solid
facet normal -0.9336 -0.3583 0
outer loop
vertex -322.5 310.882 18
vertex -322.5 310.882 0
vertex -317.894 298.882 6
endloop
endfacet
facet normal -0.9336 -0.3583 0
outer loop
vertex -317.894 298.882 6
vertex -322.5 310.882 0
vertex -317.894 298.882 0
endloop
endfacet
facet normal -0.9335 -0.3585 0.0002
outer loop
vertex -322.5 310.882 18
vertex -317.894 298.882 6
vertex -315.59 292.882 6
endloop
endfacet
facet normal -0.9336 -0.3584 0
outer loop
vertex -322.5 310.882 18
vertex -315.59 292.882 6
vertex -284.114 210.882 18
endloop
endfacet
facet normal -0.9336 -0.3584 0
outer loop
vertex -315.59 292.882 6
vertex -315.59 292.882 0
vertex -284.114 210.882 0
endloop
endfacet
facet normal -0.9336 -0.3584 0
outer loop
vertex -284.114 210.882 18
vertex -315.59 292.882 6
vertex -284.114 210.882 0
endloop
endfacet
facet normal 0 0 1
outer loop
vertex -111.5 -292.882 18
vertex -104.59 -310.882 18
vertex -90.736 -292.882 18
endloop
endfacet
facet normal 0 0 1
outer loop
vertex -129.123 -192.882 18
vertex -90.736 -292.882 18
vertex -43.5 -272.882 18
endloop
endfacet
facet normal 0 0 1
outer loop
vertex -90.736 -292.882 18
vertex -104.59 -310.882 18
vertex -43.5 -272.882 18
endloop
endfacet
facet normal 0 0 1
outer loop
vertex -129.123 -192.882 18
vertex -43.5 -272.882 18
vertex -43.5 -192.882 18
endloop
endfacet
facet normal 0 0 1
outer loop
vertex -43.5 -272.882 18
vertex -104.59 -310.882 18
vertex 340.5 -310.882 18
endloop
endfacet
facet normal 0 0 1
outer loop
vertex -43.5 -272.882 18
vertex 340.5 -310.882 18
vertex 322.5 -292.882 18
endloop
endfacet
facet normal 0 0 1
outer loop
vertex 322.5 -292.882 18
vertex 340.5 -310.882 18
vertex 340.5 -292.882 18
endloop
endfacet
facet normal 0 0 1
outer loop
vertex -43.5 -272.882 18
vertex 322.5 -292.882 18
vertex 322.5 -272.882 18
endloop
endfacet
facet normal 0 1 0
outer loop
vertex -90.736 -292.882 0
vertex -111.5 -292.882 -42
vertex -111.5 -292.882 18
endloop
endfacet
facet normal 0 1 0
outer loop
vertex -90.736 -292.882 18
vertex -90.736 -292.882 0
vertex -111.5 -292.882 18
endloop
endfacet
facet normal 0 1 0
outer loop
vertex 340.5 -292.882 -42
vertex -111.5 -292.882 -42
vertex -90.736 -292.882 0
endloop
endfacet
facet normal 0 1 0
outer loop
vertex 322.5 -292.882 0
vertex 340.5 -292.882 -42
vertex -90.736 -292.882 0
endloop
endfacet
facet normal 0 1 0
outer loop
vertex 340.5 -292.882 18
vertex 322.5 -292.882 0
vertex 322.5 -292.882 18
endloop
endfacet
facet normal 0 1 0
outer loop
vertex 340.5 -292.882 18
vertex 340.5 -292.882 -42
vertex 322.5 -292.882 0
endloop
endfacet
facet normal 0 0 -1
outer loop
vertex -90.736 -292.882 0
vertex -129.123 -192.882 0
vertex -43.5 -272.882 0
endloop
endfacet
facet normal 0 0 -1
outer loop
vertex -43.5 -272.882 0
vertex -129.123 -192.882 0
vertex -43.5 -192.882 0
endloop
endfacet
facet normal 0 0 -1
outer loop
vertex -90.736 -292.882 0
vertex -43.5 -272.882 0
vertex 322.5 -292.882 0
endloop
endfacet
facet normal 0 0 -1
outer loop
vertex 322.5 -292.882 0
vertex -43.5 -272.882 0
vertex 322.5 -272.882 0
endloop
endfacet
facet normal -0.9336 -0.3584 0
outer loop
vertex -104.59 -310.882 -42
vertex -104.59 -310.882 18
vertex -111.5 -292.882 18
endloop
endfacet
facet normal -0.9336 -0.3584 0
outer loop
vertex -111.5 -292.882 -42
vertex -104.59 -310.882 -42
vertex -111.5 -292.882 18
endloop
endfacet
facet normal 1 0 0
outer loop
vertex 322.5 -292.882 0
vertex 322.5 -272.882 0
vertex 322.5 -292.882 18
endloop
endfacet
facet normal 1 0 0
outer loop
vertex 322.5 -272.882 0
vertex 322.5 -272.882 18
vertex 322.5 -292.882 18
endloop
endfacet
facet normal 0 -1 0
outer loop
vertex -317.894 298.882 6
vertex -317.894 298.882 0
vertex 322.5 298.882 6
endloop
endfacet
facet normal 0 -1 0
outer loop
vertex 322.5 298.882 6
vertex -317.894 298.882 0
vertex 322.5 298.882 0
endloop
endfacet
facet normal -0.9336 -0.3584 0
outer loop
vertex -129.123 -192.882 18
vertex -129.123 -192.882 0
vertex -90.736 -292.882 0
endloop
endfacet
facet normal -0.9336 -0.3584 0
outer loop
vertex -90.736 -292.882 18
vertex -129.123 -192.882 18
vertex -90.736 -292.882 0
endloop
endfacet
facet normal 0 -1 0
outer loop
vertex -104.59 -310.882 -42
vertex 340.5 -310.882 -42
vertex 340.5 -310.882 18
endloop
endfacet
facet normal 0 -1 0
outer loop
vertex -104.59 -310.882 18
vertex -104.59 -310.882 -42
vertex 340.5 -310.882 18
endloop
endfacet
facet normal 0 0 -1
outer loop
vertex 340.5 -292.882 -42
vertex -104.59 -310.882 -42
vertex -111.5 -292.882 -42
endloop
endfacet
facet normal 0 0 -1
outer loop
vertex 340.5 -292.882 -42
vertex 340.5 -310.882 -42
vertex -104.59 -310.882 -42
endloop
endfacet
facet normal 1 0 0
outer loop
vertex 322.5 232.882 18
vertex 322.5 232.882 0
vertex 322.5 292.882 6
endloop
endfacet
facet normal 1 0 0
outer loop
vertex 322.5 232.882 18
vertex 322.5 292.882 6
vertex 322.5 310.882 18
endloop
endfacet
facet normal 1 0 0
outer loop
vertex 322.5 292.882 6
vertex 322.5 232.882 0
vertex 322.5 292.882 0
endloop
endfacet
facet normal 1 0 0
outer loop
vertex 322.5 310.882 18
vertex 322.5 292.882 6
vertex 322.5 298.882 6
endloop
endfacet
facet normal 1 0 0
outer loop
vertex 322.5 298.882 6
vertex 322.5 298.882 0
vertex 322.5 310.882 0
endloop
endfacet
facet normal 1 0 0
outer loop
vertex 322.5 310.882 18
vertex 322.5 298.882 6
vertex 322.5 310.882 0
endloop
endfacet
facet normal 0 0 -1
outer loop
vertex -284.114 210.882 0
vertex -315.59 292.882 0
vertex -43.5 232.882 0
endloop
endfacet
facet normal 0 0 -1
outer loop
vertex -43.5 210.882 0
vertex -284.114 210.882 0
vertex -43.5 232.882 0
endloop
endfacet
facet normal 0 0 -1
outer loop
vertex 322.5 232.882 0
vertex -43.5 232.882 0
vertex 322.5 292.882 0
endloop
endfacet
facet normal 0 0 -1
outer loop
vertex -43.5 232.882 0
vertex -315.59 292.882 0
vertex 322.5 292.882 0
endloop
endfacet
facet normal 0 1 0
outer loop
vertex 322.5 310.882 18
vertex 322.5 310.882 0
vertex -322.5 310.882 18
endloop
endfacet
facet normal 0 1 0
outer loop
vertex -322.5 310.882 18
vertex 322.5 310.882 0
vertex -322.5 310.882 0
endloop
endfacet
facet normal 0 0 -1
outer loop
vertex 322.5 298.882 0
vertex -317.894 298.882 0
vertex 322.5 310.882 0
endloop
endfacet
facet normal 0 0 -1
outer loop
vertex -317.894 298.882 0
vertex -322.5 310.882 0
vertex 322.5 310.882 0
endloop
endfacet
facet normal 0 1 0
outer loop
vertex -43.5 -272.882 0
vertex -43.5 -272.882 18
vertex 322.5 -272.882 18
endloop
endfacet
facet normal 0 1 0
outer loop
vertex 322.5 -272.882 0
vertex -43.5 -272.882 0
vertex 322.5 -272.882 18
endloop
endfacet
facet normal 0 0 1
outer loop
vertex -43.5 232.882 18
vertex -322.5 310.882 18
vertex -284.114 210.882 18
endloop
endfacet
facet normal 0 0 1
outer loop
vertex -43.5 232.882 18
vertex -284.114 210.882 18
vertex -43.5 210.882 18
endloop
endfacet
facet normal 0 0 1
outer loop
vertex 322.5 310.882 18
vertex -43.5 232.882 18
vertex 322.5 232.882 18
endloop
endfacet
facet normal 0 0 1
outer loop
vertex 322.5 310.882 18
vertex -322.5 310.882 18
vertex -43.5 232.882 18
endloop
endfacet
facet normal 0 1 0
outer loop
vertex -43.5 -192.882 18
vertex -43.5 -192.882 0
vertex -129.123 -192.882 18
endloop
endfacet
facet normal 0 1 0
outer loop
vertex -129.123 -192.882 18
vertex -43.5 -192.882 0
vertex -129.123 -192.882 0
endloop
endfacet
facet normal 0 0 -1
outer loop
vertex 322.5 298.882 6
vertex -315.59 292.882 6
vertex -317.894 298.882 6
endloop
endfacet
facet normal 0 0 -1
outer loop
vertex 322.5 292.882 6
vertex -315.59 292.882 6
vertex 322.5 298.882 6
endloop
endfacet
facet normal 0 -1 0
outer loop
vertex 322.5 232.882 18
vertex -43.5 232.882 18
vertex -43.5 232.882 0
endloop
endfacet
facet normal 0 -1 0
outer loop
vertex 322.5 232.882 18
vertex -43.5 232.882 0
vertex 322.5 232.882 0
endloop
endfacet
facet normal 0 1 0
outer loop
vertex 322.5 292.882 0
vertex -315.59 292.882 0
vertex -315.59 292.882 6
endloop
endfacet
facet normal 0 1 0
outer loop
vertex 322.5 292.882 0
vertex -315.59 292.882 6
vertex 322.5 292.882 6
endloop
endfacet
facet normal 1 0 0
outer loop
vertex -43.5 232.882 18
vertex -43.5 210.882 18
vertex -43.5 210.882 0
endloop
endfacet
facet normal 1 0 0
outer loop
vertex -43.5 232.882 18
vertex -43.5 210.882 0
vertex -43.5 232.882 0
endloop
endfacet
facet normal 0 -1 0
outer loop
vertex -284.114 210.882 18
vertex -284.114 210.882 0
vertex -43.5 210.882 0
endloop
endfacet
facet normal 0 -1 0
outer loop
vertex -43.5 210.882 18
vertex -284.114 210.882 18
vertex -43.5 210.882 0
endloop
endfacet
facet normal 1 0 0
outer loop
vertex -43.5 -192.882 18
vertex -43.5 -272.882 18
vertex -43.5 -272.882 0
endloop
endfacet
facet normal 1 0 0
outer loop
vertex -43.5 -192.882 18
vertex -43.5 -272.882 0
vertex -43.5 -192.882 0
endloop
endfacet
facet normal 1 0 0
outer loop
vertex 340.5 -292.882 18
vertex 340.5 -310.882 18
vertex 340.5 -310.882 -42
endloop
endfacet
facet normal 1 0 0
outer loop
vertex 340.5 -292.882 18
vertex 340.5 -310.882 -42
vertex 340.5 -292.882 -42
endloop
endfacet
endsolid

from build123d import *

# Parameters (mm, degrees)
F1_DEPTH      = 18
F2_W          = 640.393632
F2_H          = 6
F3_DEPTH      = 6
F5_DEPTH      = 42
F6_W          = 18
F6_H          = 60
F7_DEPTH      = 18
F7_DEPTH_BACK = 434
F10_DEPTH     = 60
F9_W          = 366
F9_H          = 505.764564
F11_DEPTH     = 18


with BuildPart() as f1:
    # F0 (on Top) → F1 (new body)
    with BuildSketch(Plane.XY):
        Polygon((322.5, 210.882282), (322.5, 310.882282), (-322.5, 310.882282), (-284.113596, 210.882282), align=None)
        Polygon((-83.826946, -310.882282), (322.5, -310.882282), (322.5, -192.882282), (-129.122902, -192.882282), align=None)
    extrude(amount=F1_DEPTH)

    # F2 (on face) → F3 (cut)
    with BuildSketch(Plane(origin=(0, 0, 0), x_dir=(1, 0, 0), z_dir=(0, 0, -1))):
        with Locations((2.303184, -295.882282)):
            Rectangle(F2_W, F2_H)
    extrude(amount=-F3_DEPTH, mode=Mode.SUBTRACT)

    # F4 (on face) → F5 (join)
    with BuildSketch(Plane(origin=(0, 0, 0), x_dir=(1, 0, 0), z_dir=(0, 0, -1))):
        Polygon((322.5, 310.882282), (-83.826946, 310.882282), (-90.736498, 292.882282), (322.5, 292.882282), align=None)
    extrude(amount=F5_DEPTH)

    # F6 (on face) → F7 (join, two sides)
    with BuildSketch(Plane.YZ.offset(322.5)) as f7_sk:
        with Locations((-301.882282, -12)):
            Rectangle(F6_W, F6_H)
    extrude(amount=F7_DEPTH)
    extrude(f7_sk.sketch, amount=-F7_DEPTH_BACK)

    # F8 (on face) → F10 (cut)
    with BuildSketch(Plane.XY.offset(18)):
        Polygon((-104.590447, -310.882282), (-111.5, -292.882282), (-111.5, -310.882282), align=None)
    extrude(amount=-F10_DEPTH, mode=Mode.SUBTRACT)

    # F9 (on face) → F11 (cut)
    with BuildSketch(Plane.XY.offset(18)):
        with Locations((139.5, -20)):
            Rectangle(F9_W, F9_H)
    extrude(amount=-F11_DEPTH, mode=Mode.SUBTRACT)


solid = f1.part
